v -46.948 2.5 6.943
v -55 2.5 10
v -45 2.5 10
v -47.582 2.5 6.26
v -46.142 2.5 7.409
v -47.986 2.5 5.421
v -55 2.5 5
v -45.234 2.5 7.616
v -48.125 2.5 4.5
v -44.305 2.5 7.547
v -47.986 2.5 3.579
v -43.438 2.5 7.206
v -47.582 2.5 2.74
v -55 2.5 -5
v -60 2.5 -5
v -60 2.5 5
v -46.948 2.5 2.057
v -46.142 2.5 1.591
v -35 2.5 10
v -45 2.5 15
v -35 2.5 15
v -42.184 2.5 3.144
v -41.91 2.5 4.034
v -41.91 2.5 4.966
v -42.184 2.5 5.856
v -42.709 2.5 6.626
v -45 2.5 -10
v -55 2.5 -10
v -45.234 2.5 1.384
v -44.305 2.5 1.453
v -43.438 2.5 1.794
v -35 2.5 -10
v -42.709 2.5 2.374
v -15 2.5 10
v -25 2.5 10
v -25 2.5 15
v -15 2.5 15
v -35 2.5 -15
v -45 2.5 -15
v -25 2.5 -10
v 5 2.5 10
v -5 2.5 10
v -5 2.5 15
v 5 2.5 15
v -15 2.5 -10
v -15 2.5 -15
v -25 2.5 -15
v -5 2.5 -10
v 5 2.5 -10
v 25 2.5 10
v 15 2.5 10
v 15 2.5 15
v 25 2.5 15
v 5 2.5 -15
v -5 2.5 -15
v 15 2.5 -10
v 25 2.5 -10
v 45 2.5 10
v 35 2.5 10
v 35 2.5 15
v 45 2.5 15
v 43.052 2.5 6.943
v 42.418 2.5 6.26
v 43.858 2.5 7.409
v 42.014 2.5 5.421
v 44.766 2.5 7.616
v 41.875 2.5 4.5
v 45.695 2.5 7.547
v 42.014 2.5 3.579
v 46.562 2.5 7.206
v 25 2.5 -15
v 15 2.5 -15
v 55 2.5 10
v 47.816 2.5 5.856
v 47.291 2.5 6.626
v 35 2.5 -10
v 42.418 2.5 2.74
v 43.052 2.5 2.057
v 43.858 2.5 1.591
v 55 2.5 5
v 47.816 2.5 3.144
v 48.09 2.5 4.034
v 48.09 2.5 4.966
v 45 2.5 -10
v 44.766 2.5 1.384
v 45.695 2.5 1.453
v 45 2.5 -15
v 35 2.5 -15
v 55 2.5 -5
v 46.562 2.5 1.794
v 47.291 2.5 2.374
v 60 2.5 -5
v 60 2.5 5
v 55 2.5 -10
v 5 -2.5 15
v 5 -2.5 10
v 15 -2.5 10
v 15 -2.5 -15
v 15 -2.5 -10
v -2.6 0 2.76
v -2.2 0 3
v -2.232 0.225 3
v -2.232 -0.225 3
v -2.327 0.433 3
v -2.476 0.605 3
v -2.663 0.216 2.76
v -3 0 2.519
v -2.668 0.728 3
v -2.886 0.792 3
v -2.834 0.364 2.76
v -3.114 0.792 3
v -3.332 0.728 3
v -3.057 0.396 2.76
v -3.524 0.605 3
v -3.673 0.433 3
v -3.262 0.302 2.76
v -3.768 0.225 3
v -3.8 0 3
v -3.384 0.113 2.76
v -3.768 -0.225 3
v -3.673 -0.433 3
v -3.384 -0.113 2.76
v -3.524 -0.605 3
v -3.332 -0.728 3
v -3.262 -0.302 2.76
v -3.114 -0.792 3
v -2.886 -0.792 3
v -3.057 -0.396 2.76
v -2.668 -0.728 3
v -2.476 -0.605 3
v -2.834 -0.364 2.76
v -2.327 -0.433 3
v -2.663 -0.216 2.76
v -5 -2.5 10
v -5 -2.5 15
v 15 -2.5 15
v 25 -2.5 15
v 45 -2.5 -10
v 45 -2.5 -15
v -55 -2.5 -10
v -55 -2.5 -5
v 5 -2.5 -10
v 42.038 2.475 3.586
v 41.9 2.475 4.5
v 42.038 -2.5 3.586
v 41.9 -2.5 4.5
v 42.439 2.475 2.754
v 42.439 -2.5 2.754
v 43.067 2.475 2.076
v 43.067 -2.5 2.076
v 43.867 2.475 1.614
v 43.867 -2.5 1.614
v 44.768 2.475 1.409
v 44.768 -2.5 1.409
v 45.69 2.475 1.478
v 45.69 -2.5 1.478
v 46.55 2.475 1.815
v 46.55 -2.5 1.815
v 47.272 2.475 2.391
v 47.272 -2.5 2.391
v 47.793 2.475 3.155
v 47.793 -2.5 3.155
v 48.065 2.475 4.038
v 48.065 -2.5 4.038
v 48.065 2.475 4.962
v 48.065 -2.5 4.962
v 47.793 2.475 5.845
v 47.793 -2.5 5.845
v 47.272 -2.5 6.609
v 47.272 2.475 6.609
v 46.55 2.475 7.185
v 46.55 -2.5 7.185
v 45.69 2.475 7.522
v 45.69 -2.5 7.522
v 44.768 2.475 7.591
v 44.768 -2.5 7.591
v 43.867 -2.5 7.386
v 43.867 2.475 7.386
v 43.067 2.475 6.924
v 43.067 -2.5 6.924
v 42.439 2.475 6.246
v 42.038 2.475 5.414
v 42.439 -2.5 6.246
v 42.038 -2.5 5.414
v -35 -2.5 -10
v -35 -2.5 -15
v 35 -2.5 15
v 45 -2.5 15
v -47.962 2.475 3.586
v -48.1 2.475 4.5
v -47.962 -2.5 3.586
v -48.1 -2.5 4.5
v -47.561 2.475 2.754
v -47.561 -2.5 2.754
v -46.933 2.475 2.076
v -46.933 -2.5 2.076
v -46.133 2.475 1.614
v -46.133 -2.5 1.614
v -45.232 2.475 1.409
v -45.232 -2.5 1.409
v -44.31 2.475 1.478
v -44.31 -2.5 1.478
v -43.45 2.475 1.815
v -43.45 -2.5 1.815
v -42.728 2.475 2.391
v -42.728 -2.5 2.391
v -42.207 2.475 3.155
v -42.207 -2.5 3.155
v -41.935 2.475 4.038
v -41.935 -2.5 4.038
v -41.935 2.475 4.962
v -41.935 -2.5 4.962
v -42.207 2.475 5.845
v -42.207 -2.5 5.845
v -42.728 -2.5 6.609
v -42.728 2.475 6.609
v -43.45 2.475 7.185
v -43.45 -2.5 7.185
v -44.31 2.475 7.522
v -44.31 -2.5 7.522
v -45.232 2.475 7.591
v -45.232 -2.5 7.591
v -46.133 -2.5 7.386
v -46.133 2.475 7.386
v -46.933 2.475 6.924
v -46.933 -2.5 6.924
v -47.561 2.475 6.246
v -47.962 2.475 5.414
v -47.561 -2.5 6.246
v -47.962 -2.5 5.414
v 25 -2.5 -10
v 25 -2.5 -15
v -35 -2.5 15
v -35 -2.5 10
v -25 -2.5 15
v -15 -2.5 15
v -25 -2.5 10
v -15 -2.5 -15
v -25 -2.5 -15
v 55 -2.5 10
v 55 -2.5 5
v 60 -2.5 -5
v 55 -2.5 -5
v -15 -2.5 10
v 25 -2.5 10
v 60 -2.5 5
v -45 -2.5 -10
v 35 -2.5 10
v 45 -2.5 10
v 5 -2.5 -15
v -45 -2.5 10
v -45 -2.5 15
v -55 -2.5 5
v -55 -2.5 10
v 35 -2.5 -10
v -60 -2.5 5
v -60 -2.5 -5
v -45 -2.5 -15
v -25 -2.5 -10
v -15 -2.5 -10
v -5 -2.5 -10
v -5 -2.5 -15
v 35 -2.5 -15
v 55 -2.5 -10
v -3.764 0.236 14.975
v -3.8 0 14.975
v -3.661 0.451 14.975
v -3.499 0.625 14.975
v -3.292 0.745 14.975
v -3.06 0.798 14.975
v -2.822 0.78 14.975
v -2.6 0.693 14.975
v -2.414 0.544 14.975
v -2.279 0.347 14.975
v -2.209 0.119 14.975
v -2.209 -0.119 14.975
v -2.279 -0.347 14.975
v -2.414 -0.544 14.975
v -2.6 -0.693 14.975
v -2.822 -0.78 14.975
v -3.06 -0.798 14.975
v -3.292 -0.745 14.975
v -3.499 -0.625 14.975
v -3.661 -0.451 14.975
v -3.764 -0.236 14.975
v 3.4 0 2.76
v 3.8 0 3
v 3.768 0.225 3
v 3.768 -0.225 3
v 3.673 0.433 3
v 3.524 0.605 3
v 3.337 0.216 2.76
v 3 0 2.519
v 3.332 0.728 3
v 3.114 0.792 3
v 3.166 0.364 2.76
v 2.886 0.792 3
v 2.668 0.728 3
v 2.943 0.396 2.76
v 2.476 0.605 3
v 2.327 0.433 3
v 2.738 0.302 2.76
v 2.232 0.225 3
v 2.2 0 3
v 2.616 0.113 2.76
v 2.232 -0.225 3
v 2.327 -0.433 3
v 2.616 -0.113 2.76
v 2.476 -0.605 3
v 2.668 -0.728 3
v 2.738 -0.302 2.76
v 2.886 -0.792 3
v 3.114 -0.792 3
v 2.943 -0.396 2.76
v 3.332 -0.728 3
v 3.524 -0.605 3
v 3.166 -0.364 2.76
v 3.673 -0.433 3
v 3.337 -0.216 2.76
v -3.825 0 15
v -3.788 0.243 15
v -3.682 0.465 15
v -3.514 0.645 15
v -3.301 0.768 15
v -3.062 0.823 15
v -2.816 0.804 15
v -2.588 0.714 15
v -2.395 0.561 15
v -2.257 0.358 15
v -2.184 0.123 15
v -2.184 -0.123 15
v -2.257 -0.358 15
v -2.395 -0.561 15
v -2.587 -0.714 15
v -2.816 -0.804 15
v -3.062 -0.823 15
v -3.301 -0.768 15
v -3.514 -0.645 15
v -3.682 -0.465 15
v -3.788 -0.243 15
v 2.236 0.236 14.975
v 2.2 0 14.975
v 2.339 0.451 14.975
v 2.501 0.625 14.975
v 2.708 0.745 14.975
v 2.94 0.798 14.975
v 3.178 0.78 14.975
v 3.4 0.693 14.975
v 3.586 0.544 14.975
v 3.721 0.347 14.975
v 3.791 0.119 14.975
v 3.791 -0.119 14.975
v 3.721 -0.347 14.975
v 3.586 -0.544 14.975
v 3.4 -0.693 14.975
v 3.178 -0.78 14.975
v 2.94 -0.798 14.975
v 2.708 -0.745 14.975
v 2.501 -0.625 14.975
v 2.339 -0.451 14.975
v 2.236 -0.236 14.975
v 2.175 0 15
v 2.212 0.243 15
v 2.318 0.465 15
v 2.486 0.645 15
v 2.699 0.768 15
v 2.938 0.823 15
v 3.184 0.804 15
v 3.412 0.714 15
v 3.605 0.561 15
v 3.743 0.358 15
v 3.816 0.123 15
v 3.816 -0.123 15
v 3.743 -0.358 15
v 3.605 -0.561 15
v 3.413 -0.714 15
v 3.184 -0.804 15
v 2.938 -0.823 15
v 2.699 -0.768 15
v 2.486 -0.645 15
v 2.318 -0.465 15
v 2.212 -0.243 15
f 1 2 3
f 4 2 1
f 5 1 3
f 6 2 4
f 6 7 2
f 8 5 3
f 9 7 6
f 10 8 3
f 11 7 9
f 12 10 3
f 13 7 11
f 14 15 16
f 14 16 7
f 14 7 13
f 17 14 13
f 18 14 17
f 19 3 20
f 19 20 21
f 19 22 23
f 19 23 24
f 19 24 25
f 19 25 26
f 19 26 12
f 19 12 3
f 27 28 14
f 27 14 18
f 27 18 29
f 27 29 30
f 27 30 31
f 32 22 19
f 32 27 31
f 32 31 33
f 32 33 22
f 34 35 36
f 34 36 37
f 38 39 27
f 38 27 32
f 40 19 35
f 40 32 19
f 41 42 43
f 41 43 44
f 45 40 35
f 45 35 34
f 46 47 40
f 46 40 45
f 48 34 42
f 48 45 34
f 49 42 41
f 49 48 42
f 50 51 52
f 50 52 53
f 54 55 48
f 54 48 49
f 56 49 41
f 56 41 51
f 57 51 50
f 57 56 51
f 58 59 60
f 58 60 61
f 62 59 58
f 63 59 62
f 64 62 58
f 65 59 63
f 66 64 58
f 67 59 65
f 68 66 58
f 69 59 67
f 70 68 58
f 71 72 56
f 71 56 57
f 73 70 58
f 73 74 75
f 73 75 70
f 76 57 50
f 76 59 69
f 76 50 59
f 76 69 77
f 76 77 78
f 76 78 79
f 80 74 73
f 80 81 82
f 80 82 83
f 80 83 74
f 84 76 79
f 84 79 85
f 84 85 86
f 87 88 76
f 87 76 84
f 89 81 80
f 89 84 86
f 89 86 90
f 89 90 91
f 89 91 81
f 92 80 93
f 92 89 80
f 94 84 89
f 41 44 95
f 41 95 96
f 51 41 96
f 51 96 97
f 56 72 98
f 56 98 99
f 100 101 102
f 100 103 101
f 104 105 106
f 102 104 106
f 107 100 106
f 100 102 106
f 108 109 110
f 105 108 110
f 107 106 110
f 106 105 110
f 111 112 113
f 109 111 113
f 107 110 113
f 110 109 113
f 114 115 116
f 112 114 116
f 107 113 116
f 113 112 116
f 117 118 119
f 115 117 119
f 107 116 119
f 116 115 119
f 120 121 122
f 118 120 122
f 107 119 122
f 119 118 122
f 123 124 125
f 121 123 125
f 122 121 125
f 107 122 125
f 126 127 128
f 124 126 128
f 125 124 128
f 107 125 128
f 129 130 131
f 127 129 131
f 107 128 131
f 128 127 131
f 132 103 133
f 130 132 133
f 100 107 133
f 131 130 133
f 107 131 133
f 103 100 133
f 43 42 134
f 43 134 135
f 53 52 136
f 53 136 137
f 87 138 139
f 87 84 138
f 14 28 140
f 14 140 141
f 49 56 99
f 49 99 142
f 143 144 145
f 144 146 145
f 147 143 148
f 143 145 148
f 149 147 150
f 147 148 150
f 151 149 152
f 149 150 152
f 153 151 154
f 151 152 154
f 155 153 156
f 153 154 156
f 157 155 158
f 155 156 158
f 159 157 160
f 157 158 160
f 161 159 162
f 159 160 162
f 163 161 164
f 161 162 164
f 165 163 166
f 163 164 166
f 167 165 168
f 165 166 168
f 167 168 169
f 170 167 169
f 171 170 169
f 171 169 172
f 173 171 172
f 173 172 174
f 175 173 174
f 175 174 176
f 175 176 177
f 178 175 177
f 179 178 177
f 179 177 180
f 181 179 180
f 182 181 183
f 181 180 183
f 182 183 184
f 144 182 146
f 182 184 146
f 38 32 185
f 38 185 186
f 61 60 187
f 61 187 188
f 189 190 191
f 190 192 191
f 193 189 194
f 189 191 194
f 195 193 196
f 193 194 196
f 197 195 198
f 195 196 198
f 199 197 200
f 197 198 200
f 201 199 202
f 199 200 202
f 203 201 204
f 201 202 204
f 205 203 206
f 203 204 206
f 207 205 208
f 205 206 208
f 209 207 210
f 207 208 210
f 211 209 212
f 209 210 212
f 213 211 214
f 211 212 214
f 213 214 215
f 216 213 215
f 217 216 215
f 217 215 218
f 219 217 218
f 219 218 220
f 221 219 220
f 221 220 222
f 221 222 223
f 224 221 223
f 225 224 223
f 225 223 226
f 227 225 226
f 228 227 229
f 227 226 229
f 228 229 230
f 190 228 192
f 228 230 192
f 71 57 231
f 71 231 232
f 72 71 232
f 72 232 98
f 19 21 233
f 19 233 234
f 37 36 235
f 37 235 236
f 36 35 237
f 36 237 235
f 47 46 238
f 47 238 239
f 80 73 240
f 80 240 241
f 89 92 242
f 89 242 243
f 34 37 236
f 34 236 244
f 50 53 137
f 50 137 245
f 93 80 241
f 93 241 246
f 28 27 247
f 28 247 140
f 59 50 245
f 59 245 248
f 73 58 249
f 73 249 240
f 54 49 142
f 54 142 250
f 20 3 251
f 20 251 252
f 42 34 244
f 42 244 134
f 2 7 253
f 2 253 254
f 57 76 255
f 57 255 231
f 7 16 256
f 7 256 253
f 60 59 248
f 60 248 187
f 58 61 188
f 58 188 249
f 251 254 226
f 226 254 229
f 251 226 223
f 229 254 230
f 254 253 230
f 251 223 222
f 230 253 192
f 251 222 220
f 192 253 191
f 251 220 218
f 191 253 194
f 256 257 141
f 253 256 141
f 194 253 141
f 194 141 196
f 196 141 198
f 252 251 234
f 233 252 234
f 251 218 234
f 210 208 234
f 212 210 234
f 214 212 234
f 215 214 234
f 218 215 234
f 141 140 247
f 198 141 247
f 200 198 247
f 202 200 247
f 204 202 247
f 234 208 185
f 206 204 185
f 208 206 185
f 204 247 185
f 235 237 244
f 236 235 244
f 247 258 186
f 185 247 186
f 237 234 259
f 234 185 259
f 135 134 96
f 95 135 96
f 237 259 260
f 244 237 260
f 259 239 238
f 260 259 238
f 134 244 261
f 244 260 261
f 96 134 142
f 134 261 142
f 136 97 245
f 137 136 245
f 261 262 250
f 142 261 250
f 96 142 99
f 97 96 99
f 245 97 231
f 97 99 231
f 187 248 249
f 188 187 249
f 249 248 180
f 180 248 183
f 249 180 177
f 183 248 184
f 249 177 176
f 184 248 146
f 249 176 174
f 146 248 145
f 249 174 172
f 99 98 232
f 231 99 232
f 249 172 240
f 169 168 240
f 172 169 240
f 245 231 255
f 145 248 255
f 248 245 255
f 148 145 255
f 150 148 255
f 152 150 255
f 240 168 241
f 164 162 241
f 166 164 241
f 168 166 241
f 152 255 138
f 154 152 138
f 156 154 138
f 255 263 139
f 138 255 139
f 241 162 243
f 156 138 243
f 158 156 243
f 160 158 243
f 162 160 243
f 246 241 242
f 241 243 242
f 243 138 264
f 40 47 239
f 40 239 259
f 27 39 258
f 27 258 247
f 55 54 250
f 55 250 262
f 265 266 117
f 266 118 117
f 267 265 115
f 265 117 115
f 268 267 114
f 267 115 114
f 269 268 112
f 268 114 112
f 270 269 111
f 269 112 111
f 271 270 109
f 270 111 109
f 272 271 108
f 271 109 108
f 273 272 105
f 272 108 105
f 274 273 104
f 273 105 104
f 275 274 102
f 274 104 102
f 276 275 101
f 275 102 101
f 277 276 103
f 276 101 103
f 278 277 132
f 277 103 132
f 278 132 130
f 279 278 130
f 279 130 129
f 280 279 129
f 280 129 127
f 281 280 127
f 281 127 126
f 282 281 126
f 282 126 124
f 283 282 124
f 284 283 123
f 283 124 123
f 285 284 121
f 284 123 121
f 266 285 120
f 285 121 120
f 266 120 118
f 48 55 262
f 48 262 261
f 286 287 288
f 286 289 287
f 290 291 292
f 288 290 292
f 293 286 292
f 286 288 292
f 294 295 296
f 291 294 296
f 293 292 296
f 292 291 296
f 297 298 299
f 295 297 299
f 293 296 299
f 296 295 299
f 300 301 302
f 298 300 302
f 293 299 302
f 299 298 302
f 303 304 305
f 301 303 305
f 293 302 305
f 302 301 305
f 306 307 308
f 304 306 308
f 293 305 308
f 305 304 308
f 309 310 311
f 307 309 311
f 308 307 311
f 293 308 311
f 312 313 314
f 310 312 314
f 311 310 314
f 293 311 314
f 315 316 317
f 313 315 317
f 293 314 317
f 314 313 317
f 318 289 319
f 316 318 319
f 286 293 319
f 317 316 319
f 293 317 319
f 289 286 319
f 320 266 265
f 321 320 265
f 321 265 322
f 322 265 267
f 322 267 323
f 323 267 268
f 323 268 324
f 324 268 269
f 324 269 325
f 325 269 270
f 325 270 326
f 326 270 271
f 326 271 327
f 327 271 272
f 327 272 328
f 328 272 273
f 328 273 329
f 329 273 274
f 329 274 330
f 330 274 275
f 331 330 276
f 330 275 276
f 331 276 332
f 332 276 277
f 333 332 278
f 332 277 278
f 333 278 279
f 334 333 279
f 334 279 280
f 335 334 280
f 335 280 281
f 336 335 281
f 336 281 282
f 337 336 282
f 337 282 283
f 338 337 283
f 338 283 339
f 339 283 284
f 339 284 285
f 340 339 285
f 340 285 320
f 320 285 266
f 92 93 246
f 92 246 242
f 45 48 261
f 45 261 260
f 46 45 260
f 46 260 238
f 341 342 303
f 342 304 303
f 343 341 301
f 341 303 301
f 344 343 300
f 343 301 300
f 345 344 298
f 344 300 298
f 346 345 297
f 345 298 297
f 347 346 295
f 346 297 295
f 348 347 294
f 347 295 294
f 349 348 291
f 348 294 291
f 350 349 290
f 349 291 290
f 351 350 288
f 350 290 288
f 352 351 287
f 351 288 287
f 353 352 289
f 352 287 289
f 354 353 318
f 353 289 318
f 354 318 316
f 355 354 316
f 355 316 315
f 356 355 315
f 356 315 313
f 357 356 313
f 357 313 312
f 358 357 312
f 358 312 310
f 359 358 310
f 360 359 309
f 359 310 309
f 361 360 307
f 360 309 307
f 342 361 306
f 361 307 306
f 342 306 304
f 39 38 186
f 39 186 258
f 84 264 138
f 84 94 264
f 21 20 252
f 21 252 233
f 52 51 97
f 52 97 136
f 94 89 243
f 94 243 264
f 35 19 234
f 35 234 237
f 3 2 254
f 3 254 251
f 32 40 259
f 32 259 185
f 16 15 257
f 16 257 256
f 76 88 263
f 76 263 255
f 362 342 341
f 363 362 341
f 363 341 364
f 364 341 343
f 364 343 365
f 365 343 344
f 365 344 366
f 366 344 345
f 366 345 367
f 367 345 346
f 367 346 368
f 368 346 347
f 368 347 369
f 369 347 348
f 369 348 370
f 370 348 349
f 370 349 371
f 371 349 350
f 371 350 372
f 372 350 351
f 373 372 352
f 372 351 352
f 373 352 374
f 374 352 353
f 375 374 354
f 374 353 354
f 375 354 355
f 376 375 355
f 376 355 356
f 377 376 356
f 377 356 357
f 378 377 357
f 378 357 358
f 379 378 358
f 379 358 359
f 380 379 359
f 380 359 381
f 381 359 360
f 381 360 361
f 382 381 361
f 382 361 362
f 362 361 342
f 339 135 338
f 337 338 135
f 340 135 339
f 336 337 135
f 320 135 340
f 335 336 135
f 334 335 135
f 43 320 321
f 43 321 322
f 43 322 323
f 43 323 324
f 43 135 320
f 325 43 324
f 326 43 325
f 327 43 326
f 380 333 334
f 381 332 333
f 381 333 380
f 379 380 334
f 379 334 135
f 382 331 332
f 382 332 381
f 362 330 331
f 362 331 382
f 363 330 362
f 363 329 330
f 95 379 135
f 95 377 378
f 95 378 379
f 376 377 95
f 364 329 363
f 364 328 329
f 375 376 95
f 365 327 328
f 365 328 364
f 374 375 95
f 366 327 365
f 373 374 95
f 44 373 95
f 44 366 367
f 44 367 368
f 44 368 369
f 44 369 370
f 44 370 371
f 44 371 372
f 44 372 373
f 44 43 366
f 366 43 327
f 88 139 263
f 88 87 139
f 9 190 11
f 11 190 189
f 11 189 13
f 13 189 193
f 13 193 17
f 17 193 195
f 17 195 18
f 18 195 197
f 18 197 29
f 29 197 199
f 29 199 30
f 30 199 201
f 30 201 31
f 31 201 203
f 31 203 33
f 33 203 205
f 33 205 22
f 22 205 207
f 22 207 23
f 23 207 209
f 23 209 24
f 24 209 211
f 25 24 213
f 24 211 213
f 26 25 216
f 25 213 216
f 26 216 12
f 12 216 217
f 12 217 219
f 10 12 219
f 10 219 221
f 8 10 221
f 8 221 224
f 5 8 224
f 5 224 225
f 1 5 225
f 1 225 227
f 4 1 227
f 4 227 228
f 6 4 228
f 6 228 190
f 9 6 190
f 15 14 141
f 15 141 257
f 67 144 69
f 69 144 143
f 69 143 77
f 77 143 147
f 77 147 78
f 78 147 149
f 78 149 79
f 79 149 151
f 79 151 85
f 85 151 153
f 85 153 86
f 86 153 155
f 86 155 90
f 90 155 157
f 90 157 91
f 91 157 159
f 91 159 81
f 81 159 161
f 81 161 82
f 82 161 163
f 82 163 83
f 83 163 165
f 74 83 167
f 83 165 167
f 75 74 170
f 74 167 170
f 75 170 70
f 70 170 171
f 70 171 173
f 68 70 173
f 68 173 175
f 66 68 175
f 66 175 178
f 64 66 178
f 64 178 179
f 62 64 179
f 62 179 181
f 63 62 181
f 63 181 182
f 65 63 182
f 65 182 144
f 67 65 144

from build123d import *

# Parameters (mm, degrees)
BOSS_EXTRUDE1_DEPTH                  = 2.5
TAP_DRILL_FOR_M2_TAP1_D              = 1.6
TAP_DRILL_FOR_M2_TAP1_DEPTH          = 12
TAP_DRILL_FOR_M2_TAP1_CSINK_D        = 1.65
TAP_DRILL_FOR_M2_TAP1_CSINK_ANGLE    = 90
TAP_DRILL_FOR_M2_TAP1_TIP            = 0.480688495
F_6_2_6_2_DIAMETER_HOLE1_D           = 6.2
F_6_2_6_2_DIAMETER_HOLE1_CSINK_D     = 6.25
F_6_2_6_2_DIAMETER_HOLE1_CSINK_ANGLE = 90


with BuildPart() as part:
    # Sketch1 → Boss-Extrude1 (new, symmetric)
    with BuildSketch(Plane(origin=(0, 0, 0), x_dir=(1, 0, 0), z_dir=(0, 1, 0))):
        Polygon((45, 15), (35, 15), (35, 10), (25, 10), (25, 15), (15, 15), (15, 10), (5, 10), (5, 15), (-5, 15), (-5, 10), (-15, 10), (-15, 15), (-25, 15), (-25, 10), (-35, 10), (-35, 15), (-45, 15), (-45, 10), (-55, 10), (-55, 5), (-60, 5), (-60, -5), (-55, -5), (-55, -10), (-45, -10), (-45, -15), (-35, -15), (-35, -10), (-25, -10), (-25, -15), (-15, -15), (-15, -10), (-5, -10), (-5, -15), (5, -15), (5, -10), (15, -10), (15, -15), (25, -15), (25, -10), (35, -10), (35, -15), (45, -15), (45, -10), (55, -10), (55, -5), (60, -5), (60, 5), (55, 5), (55, 10), (45, 10), align=None)
    extrude(amount=BOSS_EXTRUDE1_DEPTH, both=True)

    # Tap Drill for M2 Tap1
    with Locations(Plane.XY.offset(15)):
        with Locations((-3, 0), (3, 0)):
            CounterSinkHole(TAP_DRILL_FOR_M2_TAP1_D / 2, TAP_DRILL_FOR_M2_TAP1_CSINK_D / 2, depth=TAP_DRILL_FOR_M2_TAP1_DEPTH, counter_sink_angle=TAP_DRILL_FOR_M2_TAP1_CSINK_ANGLE)
            with Locations((0, 0, -(TAP_DRILL_FOR_M2_TAP1_DEPTH + TAP_DRILL_FOR_M2_TAP1_TIP / 2))):  # 118° drill point
                Cone(0, TAP_DRILL_FOR_M2_TAP1_D / 2, TAP_DRILL_FOR_M2_TAP1_TIP, mode=Mode.SUBTRACT)

    # Ø6.2 (6.2) Diameter Hole1 (through all)
    with Locations(Plane(origin=(0, 2.5, 0), x_dir=(1, 0, 0), z_dir=(0, 1, 0))):
        with Locations((-45, -4.5), (45, -4.5)):
            CounterSinkHole(F_6_2_6_2_DIAMETER_HOLE1_D / 2, F_6_2_6_2_DIAMETER_HOLE1_CSINK_D / 2, counter_sink_angle=F_6_2_6_2_DIAMETER_HOLE1_CSINK_ANGLE)


solid = part.part
